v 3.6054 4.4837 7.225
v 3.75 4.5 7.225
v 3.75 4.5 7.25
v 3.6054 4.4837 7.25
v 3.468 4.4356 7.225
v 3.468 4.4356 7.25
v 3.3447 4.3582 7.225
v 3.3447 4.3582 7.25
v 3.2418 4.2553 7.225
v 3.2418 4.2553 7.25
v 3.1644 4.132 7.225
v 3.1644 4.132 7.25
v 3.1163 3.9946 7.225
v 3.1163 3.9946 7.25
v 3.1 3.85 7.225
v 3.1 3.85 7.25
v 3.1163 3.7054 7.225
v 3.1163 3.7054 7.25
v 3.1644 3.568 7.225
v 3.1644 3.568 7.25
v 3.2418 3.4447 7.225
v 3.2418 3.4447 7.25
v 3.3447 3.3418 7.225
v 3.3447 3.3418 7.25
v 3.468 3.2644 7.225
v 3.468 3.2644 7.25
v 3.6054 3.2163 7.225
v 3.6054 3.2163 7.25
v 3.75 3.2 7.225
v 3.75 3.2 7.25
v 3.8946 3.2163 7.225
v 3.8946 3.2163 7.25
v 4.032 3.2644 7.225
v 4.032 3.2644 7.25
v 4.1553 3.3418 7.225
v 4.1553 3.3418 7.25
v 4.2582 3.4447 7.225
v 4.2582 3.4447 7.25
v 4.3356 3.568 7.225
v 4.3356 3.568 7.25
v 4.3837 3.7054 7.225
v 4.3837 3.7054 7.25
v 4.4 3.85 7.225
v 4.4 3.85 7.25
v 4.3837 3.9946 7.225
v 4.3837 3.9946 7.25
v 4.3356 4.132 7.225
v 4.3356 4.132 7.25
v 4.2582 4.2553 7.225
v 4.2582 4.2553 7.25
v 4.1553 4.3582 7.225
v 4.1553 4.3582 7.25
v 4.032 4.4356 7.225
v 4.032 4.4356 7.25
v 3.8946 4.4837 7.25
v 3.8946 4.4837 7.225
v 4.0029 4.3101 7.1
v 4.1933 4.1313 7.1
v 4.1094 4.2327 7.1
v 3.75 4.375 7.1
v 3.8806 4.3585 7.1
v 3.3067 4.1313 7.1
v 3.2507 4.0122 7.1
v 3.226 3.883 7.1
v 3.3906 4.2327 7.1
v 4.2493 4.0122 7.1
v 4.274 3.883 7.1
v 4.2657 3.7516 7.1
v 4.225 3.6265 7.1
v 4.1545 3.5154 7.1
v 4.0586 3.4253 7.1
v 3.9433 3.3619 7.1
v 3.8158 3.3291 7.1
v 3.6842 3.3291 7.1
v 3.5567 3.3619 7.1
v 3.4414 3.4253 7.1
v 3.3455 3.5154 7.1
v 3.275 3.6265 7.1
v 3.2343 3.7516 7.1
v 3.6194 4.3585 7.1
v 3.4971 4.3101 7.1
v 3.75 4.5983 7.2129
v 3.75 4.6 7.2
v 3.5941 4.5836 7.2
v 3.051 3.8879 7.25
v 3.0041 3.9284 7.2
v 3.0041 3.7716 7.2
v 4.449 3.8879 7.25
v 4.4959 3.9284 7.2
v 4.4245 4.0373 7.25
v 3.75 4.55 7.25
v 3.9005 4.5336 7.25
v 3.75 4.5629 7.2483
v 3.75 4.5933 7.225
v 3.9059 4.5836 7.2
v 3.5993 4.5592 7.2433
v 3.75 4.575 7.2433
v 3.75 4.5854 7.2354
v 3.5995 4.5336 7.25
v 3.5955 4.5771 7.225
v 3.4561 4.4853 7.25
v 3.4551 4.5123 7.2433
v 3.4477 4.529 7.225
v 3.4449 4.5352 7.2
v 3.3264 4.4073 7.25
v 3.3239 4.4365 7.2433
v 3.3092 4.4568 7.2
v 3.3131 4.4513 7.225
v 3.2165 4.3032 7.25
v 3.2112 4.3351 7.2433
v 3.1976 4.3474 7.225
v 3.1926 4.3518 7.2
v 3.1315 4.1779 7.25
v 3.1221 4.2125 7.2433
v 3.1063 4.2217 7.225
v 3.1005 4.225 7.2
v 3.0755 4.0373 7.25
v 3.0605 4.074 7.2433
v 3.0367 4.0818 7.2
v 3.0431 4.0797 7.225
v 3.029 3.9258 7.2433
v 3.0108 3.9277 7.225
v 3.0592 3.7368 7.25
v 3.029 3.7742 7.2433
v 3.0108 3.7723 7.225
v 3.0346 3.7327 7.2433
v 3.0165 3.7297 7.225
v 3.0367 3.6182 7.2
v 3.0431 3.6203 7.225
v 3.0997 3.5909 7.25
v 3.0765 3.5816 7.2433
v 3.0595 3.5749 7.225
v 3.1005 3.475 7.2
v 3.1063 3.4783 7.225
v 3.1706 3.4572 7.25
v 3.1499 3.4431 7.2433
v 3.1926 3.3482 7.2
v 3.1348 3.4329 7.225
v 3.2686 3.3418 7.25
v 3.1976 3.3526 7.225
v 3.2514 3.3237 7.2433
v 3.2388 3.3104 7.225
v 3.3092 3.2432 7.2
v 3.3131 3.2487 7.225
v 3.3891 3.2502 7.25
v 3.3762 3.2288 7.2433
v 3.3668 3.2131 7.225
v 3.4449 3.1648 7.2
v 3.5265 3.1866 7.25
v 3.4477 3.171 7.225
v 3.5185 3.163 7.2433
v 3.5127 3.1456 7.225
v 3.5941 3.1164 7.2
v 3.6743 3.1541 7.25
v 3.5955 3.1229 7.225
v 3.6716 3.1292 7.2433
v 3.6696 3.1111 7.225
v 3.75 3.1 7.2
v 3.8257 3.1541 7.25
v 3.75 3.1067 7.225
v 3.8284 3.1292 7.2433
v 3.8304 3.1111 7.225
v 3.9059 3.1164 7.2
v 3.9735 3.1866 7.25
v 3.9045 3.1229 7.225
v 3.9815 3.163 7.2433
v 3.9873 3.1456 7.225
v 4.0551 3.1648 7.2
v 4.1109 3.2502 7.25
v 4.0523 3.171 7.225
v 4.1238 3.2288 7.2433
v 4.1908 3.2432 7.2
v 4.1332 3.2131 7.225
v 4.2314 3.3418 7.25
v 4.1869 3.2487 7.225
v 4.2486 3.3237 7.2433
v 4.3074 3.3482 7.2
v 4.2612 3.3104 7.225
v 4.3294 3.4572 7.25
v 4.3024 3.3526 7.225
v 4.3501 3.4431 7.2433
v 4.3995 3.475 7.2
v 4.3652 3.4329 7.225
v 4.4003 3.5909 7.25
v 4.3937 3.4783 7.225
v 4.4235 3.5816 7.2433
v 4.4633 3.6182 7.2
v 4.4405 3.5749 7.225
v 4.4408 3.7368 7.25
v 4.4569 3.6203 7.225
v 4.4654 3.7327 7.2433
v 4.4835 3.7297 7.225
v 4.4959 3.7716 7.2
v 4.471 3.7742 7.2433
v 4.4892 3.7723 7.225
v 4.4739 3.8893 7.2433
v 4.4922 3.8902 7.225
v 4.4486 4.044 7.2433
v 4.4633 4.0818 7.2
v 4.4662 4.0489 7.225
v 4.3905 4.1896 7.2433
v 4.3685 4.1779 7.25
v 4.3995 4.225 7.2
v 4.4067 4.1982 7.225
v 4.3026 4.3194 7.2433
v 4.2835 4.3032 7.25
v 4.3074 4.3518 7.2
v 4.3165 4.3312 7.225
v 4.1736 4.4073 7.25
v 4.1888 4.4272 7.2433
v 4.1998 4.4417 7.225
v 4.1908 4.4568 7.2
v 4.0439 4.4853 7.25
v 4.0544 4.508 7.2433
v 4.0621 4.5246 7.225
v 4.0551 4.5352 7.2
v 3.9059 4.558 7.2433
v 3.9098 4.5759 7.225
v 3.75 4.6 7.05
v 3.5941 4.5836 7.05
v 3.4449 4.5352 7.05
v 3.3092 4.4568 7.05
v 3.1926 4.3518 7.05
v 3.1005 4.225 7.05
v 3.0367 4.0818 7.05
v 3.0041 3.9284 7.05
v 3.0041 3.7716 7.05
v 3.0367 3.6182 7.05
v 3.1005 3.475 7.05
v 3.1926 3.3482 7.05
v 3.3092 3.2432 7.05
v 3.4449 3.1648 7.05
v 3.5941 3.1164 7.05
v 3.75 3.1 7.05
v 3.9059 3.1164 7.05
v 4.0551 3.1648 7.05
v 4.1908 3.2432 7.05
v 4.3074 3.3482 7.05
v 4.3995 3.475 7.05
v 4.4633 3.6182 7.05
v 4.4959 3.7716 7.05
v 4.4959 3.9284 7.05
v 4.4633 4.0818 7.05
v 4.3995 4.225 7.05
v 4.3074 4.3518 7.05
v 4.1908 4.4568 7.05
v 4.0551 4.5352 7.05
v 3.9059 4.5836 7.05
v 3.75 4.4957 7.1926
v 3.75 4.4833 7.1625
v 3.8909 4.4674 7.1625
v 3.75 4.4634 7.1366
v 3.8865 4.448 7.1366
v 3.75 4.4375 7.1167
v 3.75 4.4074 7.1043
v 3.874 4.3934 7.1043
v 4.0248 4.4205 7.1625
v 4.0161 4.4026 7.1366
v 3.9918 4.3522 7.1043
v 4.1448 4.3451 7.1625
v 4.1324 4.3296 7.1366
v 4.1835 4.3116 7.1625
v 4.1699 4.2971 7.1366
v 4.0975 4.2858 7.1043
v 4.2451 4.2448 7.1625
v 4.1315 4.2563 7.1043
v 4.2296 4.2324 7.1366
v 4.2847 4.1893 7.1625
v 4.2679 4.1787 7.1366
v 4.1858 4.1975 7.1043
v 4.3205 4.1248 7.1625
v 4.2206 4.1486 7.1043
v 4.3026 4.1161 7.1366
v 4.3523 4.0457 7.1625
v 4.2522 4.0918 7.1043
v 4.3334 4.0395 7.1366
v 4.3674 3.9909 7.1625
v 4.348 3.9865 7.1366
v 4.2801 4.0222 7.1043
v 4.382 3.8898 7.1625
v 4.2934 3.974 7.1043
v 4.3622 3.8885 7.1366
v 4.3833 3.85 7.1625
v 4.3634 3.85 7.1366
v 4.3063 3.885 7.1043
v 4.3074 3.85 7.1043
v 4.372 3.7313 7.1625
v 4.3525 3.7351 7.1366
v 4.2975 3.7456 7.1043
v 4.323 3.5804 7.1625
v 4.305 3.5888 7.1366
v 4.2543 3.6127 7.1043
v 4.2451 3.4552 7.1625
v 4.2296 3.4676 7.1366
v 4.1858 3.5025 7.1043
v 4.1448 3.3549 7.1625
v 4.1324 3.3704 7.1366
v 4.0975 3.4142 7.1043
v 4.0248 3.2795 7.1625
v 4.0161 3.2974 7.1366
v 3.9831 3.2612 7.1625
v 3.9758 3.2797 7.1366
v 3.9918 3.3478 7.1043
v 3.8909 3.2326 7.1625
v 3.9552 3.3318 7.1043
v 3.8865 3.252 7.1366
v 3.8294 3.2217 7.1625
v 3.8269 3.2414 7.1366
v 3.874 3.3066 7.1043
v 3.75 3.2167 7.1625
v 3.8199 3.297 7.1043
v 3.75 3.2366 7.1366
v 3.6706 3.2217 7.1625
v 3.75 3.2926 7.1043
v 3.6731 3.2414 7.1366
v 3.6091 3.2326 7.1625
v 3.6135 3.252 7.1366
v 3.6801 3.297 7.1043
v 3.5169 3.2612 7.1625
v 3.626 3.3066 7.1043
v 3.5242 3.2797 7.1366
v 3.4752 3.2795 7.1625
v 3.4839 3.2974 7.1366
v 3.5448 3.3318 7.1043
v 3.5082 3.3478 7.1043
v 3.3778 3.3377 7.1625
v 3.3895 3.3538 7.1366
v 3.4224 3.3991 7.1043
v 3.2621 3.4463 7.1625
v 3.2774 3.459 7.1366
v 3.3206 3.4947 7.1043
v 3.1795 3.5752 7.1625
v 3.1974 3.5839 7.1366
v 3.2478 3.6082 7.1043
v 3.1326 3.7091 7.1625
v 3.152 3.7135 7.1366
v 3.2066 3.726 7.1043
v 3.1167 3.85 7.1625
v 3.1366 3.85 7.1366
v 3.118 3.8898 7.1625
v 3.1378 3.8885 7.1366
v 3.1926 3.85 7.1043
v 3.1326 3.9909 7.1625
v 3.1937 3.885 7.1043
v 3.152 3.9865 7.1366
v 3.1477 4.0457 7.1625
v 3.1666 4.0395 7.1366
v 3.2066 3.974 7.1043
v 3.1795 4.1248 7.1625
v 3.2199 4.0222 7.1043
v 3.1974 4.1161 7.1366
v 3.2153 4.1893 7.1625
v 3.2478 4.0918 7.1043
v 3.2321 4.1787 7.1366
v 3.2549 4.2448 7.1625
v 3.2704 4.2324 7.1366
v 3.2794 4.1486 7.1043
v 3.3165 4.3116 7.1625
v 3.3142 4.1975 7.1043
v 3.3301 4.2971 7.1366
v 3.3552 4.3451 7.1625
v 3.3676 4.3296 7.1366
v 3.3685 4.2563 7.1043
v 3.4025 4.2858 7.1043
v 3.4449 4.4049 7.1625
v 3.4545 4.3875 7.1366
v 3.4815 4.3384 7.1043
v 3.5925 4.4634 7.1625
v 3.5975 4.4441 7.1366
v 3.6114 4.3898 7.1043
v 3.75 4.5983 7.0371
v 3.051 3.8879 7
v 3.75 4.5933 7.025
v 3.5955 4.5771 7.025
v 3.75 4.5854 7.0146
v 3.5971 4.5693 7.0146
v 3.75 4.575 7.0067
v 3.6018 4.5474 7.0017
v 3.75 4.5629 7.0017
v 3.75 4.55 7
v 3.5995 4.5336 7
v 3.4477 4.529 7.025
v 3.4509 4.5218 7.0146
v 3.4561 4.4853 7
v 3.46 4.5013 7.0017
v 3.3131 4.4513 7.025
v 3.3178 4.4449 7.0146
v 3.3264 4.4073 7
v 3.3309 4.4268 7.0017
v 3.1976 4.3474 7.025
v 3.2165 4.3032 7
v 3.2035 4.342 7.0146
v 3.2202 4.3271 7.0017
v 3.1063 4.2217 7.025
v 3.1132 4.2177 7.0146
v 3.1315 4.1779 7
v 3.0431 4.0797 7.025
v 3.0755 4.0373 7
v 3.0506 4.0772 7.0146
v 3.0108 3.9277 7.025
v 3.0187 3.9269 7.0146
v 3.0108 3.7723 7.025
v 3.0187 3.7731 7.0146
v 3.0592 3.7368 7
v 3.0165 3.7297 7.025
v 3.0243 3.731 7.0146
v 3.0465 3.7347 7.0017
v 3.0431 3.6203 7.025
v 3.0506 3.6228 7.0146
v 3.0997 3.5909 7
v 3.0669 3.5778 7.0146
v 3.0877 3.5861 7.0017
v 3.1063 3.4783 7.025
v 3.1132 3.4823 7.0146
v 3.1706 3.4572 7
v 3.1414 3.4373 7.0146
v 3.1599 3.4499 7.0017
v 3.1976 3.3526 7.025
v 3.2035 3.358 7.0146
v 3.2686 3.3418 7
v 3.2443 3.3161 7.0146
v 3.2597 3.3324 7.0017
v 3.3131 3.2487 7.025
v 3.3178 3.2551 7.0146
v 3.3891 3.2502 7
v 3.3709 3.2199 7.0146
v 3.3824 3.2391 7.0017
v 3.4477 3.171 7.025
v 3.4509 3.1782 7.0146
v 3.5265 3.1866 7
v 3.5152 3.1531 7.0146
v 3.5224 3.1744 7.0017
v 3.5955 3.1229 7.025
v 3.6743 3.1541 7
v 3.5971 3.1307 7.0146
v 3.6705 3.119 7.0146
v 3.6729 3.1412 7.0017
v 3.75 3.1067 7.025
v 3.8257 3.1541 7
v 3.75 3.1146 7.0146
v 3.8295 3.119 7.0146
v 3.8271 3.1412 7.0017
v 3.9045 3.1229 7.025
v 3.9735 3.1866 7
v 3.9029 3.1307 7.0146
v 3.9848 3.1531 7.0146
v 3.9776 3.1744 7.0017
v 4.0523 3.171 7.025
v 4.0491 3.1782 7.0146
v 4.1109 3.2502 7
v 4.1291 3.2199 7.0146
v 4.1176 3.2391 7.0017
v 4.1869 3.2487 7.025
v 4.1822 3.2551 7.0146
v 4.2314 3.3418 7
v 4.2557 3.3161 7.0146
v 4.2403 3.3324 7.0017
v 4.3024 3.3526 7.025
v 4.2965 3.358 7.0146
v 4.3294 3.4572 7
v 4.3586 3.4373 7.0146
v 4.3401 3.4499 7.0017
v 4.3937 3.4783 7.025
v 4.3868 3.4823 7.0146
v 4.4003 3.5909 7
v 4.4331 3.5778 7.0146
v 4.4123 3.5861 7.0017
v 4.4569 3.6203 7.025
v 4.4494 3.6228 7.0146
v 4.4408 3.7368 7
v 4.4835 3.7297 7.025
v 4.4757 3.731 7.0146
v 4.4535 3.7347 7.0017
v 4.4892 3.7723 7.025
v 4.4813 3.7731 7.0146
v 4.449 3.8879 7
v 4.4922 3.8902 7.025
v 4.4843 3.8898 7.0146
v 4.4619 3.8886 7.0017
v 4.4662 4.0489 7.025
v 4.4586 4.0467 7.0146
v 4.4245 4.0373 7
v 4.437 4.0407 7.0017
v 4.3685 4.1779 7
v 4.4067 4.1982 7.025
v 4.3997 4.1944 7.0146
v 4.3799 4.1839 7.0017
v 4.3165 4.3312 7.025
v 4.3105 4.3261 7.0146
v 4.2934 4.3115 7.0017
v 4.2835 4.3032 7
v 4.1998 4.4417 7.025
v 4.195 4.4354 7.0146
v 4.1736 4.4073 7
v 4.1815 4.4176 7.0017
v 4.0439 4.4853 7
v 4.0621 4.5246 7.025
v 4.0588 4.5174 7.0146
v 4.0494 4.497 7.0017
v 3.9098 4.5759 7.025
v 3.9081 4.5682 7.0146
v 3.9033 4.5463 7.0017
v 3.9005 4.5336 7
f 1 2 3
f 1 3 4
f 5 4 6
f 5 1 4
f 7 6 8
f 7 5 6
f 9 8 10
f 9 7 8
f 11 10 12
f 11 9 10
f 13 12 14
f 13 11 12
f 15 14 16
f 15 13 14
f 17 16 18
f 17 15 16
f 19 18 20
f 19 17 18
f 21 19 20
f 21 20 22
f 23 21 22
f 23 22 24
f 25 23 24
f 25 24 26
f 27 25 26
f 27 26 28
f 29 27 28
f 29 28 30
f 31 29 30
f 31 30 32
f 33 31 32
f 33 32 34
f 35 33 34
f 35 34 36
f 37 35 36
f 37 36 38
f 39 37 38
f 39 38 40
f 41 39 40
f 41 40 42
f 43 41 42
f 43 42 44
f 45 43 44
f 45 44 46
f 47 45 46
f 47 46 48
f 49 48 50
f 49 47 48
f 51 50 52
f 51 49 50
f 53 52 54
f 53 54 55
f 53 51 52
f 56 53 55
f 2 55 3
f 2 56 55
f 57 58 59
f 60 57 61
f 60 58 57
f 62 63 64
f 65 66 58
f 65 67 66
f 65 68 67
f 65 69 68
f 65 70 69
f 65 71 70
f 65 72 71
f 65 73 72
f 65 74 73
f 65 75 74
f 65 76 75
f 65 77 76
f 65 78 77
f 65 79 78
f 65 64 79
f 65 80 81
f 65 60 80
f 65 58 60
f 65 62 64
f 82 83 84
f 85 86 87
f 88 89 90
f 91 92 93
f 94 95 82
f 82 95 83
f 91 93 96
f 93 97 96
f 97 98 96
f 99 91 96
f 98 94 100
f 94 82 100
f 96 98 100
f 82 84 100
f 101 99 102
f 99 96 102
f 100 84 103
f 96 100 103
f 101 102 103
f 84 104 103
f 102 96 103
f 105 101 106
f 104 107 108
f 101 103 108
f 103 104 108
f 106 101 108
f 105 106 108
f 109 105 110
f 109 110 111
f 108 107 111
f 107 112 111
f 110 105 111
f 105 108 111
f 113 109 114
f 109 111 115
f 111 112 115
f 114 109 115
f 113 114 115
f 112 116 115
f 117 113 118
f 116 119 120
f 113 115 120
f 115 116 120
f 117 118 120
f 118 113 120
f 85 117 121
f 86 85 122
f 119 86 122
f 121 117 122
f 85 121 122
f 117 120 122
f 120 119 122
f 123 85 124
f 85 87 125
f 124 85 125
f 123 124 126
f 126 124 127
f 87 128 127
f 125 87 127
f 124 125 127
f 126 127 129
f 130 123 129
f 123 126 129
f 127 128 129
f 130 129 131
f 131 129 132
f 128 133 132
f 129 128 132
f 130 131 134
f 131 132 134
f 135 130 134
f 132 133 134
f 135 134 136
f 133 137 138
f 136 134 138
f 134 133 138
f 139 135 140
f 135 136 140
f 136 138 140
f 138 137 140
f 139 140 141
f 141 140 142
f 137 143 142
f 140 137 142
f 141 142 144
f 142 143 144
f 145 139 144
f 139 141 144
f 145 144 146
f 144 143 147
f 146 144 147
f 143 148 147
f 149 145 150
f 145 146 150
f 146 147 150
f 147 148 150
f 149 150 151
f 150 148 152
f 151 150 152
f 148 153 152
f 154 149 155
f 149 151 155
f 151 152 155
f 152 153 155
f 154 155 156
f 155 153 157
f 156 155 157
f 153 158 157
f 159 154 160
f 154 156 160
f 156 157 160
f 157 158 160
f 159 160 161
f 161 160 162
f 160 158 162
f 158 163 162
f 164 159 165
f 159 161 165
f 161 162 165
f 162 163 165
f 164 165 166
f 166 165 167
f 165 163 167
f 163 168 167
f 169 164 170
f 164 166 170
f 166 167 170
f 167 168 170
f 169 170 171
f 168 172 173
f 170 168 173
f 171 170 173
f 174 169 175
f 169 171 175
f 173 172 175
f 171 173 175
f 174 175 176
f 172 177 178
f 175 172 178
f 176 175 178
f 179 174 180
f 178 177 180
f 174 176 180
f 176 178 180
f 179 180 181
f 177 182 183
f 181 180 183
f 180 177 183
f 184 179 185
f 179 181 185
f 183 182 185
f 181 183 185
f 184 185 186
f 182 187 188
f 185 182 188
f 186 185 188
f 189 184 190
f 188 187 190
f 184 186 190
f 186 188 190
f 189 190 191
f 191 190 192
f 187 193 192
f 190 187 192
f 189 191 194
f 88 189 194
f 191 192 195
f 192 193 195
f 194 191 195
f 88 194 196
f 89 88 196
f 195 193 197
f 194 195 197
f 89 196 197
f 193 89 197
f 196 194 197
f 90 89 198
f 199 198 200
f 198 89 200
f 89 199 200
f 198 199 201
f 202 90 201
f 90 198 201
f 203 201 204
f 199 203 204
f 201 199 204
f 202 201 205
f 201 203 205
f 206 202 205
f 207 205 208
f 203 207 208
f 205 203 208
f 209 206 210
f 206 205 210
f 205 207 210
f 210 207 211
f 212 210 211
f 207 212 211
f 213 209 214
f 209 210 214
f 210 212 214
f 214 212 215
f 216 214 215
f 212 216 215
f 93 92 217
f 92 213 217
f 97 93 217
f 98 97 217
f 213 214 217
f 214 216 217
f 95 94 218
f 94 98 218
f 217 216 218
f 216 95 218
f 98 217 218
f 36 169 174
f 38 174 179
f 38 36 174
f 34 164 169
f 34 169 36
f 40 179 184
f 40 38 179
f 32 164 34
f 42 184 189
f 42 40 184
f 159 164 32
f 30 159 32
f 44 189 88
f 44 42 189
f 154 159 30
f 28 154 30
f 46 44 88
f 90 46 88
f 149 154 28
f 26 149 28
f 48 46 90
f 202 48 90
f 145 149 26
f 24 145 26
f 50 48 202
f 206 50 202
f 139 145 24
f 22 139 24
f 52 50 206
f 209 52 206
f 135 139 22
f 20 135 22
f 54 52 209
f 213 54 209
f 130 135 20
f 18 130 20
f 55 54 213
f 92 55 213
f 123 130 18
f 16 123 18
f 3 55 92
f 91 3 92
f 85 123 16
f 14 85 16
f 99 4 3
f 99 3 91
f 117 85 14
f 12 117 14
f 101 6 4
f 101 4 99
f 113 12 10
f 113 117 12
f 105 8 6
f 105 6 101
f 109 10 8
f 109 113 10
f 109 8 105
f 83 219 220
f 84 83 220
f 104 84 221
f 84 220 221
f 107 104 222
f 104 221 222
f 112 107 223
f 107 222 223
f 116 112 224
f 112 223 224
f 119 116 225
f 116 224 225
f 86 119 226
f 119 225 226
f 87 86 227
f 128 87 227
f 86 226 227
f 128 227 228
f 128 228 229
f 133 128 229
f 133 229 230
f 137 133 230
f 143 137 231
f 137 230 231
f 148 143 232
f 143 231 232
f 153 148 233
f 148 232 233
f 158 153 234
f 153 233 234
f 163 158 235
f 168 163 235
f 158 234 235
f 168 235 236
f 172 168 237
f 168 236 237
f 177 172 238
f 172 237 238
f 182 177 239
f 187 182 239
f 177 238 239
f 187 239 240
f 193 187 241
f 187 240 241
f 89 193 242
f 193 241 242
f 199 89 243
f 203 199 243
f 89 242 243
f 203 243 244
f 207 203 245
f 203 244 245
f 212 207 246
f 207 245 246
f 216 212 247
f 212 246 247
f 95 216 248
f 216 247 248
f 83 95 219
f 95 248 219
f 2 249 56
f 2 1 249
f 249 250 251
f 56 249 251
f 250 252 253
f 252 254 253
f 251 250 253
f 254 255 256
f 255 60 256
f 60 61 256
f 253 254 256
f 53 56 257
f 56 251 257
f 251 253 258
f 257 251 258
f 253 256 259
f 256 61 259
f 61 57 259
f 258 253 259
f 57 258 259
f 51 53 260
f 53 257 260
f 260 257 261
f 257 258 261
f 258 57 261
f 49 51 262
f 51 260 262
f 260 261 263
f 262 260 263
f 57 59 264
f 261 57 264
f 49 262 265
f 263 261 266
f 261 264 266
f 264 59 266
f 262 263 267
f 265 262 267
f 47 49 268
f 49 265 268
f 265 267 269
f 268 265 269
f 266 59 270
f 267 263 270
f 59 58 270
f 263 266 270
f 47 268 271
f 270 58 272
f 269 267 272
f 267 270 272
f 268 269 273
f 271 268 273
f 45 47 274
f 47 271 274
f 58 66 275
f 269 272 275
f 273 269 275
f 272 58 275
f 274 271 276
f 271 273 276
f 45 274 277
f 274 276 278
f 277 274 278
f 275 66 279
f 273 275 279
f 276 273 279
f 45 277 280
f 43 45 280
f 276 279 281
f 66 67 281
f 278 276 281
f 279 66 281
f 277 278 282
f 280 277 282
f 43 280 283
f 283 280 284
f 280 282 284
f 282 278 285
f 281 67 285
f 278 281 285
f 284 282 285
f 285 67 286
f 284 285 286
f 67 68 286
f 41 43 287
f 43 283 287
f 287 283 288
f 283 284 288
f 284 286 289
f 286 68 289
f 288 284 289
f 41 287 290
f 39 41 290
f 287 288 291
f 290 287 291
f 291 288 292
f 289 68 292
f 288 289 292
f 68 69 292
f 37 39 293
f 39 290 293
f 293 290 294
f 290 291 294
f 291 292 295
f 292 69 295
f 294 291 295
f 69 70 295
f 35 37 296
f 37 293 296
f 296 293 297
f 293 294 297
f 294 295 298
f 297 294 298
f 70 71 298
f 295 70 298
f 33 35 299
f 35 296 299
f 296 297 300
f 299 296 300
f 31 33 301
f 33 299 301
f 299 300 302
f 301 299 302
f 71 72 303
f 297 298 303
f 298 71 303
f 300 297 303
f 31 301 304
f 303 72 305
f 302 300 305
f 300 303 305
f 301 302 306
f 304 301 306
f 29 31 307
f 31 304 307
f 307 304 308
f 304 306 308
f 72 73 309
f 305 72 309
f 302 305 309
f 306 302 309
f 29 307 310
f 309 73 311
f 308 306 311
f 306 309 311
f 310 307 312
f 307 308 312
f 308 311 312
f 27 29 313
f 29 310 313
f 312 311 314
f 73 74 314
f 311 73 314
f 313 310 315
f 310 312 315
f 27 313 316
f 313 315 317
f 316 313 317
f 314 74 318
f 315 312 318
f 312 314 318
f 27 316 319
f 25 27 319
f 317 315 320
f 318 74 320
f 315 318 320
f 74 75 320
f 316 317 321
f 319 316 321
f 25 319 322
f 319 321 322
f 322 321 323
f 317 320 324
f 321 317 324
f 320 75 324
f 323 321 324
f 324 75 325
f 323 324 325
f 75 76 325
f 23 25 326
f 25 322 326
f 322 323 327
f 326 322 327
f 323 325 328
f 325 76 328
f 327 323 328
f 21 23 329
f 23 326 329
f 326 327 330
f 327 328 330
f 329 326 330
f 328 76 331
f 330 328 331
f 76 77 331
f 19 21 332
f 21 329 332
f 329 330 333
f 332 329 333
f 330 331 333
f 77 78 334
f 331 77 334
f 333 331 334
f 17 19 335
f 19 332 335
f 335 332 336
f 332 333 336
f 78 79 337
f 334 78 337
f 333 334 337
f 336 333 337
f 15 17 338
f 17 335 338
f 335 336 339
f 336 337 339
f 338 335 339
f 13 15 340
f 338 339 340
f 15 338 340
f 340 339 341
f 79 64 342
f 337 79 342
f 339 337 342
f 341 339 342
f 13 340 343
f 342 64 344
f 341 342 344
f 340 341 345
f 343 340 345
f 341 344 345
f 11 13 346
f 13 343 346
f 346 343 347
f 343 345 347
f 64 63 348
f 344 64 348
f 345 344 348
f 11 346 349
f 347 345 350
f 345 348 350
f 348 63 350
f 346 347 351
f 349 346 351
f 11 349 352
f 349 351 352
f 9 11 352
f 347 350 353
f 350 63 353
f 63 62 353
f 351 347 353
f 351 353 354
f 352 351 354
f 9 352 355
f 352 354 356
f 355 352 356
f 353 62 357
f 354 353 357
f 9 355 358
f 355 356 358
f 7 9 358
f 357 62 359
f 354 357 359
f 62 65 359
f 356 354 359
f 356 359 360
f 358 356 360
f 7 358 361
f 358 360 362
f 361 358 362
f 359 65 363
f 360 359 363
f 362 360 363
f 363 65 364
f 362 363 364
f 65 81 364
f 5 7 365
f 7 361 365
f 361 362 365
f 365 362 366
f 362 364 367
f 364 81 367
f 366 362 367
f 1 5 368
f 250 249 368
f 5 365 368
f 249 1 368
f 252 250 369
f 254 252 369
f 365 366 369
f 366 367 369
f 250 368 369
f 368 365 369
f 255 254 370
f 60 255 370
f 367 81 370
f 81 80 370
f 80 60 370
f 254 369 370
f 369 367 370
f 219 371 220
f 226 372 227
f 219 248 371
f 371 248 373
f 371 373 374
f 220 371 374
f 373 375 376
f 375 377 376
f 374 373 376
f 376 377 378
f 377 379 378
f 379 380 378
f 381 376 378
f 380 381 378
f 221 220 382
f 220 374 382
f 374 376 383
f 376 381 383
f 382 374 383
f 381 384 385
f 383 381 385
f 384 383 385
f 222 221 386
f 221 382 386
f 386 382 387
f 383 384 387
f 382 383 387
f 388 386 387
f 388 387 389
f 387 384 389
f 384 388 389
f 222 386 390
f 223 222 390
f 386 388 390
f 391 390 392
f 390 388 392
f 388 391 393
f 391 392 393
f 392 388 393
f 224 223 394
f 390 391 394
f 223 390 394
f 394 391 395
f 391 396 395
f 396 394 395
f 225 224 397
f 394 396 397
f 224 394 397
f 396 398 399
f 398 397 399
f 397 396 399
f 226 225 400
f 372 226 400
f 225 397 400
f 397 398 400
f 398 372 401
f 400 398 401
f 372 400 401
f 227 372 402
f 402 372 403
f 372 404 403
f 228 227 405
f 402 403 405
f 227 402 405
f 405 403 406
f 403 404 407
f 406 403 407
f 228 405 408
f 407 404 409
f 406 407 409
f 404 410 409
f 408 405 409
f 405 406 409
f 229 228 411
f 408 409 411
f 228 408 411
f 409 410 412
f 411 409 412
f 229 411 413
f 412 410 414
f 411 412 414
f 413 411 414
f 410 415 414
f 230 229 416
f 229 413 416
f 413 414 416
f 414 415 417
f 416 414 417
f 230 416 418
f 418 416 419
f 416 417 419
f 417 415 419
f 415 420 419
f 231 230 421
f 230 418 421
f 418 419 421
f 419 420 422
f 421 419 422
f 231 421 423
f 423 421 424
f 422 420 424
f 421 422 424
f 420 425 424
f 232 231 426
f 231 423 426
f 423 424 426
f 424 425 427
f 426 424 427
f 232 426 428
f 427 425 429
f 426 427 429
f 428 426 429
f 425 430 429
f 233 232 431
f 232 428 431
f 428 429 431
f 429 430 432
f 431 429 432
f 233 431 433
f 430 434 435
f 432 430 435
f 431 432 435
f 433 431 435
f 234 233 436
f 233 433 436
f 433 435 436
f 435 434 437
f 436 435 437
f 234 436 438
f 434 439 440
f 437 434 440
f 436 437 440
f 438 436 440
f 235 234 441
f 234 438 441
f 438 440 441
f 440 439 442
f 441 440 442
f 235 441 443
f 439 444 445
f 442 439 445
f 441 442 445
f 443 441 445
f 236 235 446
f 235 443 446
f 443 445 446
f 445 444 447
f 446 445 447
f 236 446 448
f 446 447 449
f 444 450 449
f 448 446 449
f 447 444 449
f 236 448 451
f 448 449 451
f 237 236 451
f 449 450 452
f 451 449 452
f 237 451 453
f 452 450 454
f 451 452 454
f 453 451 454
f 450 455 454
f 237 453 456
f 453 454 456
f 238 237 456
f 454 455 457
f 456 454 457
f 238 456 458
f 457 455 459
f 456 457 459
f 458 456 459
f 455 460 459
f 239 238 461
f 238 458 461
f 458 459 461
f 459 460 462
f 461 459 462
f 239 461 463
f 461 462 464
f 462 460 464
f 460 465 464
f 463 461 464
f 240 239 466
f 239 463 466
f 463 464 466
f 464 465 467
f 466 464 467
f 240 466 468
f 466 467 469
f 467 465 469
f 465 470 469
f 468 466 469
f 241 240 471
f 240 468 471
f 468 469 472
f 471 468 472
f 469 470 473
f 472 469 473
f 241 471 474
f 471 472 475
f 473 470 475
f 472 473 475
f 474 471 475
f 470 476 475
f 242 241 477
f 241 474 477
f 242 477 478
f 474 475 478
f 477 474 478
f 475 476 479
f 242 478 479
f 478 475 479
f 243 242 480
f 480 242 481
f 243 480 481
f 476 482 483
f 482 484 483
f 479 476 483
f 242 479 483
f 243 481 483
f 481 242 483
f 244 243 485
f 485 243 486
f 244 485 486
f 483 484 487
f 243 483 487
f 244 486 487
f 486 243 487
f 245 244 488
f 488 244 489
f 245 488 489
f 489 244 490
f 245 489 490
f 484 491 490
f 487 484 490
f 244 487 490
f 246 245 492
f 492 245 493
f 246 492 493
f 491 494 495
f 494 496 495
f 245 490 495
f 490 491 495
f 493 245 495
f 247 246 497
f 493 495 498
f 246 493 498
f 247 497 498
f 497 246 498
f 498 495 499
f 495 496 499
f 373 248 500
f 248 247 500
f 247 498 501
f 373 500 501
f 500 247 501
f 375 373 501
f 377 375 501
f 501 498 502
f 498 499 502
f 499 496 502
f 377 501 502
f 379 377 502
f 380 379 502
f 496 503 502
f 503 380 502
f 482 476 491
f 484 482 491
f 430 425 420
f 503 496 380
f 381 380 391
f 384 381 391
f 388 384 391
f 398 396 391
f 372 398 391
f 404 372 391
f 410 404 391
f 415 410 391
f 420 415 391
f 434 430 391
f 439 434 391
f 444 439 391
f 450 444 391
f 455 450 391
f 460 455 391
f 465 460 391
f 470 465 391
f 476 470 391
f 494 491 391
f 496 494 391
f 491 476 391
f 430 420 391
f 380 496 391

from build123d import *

# Parameters (mm, degrees)
SKETCH010_R  = 0.75
PAD003_DEPTH = 0.25
THICKNESS_T  = -0.1
FILLET_R     = 0.125
FILLET001_R  = 0.05


with BuildPart() as part:
    # Sketch010 → Pad003 (new body)
    with BuildSketch(Plane(origin=(3.75, 3.85, 7), x_dir=(0, 1, 0), z_dir=(0, 0, 1))):
        Circle(SKETCH010_R)
    extrude(amount=PAD003_DEPTH)

    # Thickness
    thickness_openings = [part.faces().sort_by_distance(p)[0] for p in [
        (3.75, 3.85, 7.25),
    ]]
    offset(amount=THICKNESS_T, openings=thickness_openings)

    # Fillet
    fillet_edges = [part.edges().sort_by_distance(p)[0] for p in [
        (3.75, 3.2, 7.1),
    ]]
    fillet(fillet_edges, radius=FILLET_R)

    # Fillet001
    fillet001_edges = [part.edges().sort_by_distance(p)[0] for p in [
        (3.75, 3.1, 7.25),
        (3.75, 3.1, 7),
    ]]
    fillet(fillet001_edges, radius=FILLET001_R)


solid = part.part
